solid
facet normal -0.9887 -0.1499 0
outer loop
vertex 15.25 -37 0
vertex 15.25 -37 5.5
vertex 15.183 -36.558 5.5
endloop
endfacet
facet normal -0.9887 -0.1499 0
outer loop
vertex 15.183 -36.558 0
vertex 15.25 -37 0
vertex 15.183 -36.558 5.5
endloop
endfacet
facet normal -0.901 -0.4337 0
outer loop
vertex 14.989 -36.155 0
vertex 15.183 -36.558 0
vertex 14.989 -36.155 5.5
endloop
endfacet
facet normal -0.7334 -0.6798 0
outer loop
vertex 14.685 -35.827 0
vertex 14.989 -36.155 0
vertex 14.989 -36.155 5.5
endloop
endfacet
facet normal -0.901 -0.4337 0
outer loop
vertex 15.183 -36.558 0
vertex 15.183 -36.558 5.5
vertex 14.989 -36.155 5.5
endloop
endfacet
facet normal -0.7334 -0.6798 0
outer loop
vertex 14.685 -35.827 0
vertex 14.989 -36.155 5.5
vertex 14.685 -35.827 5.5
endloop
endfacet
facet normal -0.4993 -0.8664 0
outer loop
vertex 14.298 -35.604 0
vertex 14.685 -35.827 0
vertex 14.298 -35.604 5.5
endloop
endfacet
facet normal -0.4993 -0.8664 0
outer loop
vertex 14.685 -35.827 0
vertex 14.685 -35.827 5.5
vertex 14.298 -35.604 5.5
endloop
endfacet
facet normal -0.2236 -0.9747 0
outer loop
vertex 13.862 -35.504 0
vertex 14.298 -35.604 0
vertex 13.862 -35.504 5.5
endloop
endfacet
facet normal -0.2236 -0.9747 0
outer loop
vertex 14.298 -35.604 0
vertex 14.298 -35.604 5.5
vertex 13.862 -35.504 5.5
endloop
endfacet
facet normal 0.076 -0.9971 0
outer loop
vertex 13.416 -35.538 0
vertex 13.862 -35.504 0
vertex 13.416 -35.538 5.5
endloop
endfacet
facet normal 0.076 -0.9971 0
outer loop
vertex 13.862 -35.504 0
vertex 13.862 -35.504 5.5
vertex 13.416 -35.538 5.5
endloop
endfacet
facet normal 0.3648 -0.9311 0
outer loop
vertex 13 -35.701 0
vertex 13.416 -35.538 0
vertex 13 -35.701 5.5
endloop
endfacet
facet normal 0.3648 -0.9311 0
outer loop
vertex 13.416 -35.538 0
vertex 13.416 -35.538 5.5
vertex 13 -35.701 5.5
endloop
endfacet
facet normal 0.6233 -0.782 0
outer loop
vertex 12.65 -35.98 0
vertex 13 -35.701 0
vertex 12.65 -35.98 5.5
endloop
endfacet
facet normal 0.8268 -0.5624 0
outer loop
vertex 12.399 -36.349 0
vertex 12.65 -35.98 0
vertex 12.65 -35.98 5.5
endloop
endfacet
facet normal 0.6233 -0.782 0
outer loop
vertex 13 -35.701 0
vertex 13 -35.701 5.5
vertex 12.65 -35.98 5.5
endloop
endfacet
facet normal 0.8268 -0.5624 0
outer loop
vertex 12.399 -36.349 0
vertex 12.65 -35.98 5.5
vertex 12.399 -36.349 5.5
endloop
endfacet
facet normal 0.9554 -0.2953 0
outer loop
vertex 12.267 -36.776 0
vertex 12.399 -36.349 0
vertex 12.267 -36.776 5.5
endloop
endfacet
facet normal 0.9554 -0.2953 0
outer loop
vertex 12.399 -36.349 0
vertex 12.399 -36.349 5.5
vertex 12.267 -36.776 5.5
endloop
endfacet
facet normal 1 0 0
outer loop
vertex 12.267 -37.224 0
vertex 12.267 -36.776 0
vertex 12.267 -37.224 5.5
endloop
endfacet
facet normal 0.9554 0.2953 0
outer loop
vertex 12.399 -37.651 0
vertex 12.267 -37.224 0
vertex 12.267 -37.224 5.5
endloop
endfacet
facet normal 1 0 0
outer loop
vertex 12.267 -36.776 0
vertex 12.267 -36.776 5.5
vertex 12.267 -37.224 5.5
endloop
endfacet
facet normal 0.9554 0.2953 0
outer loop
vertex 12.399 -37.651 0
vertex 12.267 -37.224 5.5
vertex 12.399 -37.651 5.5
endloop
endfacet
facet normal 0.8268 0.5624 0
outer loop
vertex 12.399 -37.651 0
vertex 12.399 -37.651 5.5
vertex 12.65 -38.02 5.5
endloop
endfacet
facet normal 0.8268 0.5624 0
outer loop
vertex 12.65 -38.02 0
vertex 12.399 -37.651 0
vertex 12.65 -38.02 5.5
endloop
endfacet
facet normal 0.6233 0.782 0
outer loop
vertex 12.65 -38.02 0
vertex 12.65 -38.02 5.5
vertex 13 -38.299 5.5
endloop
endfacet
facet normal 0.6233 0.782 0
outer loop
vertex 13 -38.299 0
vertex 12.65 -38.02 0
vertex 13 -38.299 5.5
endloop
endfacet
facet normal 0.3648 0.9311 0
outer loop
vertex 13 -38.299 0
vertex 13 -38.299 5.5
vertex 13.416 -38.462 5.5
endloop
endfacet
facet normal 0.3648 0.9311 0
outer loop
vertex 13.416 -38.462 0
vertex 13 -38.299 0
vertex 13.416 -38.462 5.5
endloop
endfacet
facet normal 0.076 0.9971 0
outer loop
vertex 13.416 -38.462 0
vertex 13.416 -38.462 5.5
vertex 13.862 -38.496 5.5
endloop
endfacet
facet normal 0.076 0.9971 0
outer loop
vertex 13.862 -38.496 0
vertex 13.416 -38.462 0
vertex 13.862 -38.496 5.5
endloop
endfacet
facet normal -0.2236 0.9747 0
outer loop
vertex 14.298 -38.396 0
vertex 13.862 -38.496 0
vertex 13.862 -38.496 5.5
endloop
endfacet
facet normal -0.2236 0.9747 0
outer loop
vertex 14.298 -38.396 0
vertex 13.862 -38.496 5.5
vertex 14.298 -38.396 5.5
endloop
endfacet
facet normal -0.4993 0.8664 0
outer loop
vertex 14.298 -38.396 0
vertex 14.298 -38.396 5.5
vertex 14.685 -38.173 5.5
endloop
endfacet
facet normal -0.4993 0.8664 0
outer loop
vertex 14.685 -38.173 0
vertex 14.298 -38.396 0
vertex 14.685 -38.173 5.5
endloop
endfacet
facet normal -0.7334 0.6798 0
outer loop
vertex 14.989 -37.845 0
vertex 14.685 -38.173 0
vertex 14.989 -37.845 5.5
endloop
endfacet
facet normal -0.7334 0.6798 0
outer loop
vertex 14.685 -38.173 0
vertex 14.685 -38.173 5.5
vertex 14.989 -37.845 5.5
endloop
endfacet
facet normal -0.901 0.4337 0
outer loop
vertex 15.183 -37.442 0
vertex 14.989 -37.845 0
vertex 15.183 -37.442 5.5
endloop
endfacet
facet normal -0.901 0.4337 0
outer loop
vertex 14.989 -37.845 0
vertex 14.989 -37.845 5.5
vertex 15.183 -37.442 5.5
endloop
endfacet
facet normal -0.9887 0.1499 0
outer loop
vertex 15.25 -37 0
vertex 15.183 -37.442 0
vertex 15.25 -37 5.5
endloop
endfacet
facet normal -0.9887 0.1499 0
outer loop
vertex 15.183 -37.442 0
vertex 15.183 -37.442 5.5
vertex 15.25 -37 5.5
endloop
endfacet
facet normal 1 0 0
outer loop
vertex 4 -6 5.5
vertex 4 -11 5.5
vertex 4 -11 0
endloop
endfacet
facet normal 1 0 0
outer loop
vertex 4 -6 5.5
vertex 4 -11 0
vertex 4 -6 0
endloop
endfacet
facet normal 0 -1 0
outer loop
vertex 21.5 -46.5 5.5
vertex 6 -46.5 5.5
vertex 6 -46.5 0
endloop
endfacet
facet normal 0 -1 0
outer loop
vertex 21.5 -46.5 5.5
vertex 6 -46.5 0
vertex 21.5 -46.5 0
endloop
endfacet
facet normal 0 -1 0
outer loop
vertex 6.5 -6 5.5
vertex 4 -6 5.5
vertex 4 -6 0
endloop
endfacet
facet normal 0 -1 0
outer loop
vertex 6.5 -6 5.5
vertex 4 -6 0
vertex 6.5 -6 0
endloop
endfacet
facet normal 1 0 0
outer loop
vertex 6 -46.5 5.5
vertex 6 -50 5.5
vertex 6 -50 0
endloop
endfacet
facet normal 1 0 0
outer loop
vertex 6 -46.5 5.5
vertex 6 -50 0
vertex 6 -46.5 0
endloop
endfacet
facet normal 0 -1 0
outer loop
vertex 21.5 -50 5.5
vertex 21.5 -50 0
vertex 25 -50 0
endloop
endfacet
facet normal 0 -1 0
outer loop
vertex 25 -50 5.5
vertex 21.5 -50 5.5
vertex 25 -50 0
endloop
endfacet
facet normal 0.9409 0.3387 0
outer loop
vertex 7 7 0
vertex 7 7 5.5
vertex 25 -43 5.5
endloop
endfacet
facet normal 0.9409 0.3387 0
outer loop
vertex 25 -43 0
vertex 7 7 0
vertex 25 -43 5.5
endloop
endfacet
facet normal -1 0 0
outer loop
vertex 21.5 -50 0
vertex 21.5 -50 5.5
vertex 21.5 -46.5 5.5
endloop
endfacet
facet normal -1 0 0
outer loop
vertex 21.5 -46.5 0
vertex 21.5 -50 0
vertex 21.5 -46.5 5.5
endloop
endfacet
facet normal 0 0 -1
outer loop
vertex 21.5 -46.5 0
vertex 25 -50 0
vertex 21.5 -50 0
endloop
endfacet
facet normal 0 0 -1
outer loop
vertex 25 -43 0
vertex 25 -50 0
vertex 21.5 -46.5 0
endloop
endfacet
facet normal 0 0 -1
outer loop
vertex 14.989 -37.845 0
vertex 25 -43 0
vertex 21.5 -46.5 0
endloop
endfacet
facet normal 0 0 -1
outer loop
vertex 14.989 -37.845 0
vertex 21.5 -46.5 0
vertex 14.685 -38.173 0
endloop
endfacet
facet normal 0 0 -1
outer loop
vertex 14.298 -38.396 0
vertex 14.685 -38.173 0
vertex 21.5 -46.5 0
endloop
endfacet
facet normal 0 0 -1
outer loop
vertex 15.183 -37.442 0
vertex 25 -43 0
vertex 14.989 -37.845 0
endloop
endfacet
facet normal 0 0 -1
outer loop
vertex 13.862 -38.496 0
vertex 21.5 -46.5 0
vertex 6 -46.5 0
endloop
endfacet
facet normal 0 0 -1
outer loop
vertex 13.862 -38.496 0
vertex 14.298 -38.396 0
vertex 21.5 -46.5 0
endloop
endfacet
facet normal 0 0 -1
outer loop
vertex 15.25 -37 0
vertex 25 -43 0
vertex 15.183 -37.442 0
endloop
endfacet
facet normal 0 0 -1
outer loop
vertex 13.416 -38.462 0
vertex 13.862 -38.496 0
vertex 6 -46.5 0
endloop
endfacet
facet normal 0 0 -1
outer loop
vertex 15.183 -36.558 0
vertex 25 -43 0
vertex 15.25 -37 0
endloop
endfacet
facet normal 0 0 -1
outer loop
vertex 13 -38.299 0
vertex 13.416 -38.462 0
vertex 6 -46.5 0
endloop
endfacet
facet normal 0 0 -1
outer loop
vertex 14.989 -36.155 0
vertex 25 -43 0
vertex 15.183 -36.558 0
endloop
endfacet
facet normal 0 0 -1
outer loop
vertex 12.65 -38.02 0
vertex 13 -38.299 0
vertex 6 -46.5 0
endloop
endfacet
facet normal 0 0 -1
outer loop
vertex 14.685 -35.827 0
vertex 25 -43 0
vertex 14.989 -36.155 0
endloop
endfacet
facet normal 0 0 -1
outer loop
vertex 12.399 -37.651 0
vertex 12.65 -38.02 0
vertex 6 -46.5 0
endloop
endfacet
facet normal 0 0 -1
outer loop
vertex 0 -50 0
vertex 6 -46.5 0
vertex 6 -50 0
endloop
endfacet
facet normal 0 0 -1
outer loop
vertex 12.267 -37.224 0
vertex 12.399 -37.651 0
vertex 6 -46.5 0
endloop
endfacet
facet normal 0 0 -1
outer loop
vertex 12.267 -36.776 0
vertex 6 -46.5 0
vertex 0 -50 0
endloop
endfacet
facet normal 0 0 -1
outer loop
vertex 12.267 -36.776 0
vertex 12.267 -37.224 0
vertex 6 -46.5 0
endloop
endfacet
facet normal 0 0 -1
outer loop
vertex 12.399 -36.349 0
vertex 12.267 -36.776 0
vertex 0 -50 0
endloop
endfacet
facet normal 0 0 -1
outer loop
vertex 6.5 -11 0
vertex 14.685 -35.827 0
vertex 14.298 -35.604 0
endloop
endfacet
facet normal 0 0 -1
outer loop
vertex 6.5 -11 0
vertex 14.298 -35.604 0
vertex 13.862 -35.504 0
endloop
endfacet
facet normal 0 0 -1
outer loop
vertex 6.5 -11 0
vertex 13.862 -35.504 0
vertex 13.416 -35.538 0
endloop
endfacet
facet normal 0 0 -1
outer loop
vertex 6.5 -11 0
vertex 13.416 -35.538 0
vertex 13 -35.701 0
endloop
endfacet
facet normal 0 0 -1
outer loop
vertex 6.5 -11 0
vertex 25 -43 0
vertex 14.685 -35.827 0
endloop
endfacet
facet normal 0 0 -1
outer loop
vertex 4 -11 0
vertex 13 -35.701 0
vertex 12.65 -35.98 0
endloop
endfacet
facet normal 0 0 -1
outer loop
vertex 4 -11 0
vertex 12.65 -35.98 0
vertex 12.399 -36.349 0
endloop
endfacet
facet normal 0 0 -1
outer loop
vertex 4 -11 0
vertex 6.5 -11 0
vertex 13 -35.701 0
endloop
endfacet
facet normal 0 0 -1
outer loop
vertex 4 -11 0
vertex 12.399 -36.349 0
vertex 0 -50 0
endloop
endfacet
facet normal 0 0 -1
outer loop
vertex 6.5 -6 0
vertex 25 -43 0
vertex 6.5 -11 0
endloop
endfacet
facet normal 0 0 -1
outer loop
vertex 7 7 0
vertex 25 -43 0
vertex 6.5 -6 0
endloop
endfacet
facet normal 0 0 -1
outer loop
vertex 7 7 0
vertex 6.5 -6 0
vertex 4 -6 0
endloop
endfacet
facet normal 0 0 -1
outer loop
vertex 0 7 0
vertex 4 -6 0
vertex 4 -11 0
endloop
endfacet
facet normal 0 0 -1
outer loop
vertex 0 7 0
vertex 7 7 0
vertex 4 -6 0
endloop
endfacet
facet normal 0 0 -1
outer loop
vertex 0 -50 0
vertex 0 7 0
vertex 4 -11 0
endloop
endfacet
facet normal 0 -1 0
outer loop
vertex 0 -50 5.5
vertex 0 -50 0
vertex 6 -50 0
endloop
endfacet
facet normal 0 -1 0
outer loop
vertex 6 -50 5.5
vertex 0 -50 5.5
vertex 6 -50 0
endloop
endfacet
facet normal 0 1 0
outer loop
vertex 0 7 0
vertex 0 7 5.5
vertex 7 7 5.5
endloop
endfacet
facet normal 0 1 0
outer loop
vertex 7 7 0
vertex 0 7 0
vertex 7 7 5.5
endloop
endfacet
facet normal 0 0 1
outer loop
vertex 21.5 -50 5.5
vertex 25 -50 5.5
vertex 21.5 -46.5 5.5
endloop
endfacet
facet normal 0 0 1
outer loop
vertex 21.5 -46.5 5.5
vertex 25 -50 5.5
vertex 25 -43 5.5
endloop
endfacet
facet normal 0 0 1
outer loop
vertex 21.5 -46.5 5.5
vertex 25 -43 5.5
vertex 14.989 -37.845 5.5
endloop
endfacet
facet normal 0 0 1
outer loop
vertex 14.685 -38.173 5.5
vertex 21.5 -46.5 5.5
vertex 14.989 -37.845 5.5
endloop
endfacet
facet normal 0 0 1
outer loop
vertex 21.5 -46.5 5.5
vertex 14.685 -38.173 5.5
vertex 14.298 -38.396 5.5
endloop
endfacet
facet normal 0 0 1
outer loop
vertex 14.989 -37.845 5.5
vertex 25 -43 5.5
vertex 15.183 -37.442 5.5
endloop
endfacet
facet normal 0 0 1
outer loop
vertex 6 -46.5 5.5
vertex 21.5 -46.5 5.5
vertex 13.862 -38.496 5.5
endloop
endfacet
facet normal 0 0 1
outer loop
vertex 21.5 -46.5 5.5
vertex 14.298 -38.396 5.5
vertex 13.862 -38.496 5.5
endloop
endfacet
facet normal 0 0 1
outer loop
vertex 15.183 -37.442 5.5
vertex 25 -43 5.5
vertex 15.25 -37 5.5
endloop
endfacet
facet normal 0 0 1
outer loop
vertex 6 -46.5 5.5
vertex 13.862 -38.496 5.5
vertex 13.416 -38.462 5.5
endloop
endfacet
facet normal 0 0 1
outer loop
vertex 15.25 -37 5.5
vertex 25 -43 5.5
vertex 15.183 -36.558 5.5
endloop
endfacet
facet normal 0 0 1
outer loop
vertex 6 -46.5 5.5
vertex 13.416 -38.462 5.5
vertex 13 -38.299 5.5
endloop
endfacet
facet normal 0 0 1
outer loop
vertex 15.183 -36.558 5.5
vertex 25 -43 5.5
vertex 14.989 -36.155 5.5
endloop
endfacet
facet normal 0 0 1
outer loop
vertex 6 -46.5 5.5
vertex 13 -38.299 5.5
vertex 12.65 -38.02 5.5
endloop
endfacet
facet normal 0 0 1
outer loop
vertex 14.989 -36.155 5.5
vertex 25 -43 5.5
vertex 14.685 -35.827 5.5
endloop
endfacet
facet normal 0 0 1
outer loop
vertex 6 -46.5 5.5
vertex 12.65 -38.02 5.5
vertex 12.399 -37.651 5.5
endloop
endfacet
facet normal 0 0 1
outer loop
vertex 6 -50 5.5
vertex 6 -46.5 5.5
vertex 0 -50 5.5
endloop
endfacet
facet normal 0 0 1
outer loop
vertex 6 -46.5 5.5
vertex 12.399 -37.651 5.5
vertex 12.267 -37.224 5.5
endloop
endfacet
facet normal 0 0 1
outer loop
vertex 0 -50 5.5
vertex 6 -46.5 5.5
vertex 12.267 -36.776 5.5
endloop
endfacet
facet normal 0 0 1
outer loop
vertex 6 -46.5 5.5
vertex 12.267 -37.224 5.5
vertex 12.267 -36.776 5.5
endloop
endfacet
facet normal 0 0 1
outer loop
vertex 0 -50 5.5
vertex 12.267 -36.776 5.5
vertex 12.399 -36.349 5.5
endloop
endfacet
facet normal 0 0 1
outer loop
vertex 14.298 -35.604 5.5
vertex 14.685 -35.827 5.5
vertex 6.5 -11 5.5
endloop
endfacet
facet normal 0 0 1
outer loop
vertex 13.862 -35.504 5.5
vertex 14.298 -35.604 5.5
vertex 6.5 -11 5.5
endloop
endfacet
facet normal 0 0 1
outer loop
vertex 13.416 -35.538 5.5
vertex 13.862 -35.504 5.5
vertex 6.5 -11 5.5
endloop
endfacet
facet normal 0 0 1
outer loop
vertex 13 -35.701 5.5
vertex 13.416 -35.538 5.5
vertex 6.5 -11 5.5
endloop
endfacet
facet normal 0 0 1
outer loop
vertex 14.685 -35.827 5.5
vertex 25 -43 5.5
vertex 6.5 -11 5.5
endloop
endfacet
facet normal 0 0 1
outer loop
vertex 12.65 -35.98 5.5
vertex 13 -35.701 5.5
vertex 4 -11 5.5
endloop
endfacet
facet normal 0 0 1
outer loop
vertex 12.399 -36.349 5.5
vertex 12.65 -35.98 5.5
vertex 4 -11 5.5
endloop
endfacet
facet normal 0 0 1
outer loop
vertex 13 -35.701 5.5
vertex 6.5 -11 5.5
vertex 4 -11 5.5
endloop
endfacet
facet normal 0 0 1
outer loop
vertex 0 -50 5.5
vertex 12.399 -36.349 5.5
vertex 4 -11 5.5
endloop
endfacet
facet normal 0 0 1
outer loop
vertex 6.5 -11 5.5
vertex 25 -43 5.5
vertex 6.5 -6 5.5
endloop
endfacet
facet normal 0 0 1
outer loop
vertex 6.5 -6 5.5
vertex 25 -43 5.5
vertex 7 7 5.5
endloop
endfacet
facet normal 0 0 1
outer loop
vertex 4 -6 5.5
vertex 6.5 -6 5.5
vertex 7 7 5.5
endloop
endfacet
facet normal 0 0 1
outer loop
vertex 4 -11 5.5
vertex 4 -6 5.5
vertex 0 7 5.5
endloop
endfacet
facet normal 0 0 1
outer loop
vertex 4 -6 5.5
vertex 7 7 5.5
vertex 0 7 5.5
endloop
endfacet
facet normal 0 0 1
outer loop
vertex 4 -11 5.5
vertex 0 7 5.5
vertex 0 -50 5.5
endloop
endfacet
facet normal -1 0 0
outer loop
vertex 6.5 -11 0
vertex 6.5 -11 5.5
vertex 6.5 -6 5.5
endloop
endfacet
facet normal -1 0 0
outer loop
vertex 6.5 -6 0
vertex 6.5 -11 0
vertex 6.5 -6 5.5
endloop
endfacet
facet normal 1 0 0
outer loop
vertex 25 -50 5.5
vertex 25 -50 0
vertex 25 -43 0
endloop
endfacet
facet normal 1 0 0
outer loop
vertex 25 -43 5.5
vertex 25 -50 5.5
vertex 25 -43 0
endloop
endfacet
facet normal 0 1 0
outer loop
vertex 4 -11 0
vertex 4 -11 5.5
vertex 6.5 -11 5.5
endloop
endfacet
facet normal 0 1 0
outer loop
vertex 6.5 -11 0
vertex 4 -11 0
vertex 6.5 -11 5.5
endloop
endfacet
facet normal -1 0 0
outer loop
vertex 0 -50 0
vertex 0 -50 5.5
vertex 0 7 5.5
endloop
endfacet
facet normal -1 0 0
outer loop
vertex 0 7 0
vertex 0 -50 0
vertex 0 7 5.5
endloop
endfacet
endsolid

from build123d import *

# Parameters (mm, degrees)
SALIENTE_EXTRUIR1_DEPTH = 5.5
SALIENTE_EXTRUIR2_DEPTH = 5.5
CROQUIS3_W              = 15.5
CROQUIS3_H              = 3.5
CORTAR_EXTRUIR1_DEPTH   = 5.5
CROQUIS4_R              = 1.5
CORTAR_EXTRUIR2_DEPTH   = 5.5
CROQUIS5_W              = 2.5
CROQUIS5_H              = 5
CORTAR_EXTRUIR3_DEPTH   = 10


with BuildPart() as part:
    # Croquis1 → Saliente-Extruir1 (new body)
    with BuildSketch(Plane.XY):
        Polygon((0, 0), (0, -50), (25, -50), (25, -43), (7, -43), (7, 0), align=None)
    extrude(amount=SALIENTE_EXTRUIR1_DEPTH)

    # Croquis2 → Saliente-Extruir2 (add)
    with BuildSketch(Plane.XY.offset(5.5)):
        Polygon((25, -43), (0, -43), (0, 7), (7, 7), align=None)
    extrude(amount=-SALIENTE_EXTRUIR2_DEPTH)

    # Croquis3 → Cortar-Extruir1 (cut)
    with BuildSketch(Plane.XY.offset(5.5)):
        with Locations((13.75, -48.25)):
            Rectangle(CROQUIS3_W, CROQUIS3_H)
    extrude(amount=-CORTAR_EXTRUIR1_DEPTH, mode=Mode.SUBTRACT)

    # Croquis4 → Cortar-Extruir2 (cut)
    with BuildSketch(Plane.XY.offset(5.5)):
        with Locations((13.75, -37)):
            Circle(CROQUIS4_R)
    extrude(amount=-CORTAR_EXTRUIR2_DEPTH, mode=Mode.SUBTRACT)

    # Croquis5 → Cortar-Extruir3 (cut)
    with BuildSketch(Plane.XY.offset(5.5)):
        with Locations((5.25, -8.5)):
            Rectangle(CROQUIS5_W, CROQUIS5_H)
    extrude(amount=-CORTAR_EXTRUIR3_DEPTH, mode=Mode.SUBTRACT)


solid = part.part
